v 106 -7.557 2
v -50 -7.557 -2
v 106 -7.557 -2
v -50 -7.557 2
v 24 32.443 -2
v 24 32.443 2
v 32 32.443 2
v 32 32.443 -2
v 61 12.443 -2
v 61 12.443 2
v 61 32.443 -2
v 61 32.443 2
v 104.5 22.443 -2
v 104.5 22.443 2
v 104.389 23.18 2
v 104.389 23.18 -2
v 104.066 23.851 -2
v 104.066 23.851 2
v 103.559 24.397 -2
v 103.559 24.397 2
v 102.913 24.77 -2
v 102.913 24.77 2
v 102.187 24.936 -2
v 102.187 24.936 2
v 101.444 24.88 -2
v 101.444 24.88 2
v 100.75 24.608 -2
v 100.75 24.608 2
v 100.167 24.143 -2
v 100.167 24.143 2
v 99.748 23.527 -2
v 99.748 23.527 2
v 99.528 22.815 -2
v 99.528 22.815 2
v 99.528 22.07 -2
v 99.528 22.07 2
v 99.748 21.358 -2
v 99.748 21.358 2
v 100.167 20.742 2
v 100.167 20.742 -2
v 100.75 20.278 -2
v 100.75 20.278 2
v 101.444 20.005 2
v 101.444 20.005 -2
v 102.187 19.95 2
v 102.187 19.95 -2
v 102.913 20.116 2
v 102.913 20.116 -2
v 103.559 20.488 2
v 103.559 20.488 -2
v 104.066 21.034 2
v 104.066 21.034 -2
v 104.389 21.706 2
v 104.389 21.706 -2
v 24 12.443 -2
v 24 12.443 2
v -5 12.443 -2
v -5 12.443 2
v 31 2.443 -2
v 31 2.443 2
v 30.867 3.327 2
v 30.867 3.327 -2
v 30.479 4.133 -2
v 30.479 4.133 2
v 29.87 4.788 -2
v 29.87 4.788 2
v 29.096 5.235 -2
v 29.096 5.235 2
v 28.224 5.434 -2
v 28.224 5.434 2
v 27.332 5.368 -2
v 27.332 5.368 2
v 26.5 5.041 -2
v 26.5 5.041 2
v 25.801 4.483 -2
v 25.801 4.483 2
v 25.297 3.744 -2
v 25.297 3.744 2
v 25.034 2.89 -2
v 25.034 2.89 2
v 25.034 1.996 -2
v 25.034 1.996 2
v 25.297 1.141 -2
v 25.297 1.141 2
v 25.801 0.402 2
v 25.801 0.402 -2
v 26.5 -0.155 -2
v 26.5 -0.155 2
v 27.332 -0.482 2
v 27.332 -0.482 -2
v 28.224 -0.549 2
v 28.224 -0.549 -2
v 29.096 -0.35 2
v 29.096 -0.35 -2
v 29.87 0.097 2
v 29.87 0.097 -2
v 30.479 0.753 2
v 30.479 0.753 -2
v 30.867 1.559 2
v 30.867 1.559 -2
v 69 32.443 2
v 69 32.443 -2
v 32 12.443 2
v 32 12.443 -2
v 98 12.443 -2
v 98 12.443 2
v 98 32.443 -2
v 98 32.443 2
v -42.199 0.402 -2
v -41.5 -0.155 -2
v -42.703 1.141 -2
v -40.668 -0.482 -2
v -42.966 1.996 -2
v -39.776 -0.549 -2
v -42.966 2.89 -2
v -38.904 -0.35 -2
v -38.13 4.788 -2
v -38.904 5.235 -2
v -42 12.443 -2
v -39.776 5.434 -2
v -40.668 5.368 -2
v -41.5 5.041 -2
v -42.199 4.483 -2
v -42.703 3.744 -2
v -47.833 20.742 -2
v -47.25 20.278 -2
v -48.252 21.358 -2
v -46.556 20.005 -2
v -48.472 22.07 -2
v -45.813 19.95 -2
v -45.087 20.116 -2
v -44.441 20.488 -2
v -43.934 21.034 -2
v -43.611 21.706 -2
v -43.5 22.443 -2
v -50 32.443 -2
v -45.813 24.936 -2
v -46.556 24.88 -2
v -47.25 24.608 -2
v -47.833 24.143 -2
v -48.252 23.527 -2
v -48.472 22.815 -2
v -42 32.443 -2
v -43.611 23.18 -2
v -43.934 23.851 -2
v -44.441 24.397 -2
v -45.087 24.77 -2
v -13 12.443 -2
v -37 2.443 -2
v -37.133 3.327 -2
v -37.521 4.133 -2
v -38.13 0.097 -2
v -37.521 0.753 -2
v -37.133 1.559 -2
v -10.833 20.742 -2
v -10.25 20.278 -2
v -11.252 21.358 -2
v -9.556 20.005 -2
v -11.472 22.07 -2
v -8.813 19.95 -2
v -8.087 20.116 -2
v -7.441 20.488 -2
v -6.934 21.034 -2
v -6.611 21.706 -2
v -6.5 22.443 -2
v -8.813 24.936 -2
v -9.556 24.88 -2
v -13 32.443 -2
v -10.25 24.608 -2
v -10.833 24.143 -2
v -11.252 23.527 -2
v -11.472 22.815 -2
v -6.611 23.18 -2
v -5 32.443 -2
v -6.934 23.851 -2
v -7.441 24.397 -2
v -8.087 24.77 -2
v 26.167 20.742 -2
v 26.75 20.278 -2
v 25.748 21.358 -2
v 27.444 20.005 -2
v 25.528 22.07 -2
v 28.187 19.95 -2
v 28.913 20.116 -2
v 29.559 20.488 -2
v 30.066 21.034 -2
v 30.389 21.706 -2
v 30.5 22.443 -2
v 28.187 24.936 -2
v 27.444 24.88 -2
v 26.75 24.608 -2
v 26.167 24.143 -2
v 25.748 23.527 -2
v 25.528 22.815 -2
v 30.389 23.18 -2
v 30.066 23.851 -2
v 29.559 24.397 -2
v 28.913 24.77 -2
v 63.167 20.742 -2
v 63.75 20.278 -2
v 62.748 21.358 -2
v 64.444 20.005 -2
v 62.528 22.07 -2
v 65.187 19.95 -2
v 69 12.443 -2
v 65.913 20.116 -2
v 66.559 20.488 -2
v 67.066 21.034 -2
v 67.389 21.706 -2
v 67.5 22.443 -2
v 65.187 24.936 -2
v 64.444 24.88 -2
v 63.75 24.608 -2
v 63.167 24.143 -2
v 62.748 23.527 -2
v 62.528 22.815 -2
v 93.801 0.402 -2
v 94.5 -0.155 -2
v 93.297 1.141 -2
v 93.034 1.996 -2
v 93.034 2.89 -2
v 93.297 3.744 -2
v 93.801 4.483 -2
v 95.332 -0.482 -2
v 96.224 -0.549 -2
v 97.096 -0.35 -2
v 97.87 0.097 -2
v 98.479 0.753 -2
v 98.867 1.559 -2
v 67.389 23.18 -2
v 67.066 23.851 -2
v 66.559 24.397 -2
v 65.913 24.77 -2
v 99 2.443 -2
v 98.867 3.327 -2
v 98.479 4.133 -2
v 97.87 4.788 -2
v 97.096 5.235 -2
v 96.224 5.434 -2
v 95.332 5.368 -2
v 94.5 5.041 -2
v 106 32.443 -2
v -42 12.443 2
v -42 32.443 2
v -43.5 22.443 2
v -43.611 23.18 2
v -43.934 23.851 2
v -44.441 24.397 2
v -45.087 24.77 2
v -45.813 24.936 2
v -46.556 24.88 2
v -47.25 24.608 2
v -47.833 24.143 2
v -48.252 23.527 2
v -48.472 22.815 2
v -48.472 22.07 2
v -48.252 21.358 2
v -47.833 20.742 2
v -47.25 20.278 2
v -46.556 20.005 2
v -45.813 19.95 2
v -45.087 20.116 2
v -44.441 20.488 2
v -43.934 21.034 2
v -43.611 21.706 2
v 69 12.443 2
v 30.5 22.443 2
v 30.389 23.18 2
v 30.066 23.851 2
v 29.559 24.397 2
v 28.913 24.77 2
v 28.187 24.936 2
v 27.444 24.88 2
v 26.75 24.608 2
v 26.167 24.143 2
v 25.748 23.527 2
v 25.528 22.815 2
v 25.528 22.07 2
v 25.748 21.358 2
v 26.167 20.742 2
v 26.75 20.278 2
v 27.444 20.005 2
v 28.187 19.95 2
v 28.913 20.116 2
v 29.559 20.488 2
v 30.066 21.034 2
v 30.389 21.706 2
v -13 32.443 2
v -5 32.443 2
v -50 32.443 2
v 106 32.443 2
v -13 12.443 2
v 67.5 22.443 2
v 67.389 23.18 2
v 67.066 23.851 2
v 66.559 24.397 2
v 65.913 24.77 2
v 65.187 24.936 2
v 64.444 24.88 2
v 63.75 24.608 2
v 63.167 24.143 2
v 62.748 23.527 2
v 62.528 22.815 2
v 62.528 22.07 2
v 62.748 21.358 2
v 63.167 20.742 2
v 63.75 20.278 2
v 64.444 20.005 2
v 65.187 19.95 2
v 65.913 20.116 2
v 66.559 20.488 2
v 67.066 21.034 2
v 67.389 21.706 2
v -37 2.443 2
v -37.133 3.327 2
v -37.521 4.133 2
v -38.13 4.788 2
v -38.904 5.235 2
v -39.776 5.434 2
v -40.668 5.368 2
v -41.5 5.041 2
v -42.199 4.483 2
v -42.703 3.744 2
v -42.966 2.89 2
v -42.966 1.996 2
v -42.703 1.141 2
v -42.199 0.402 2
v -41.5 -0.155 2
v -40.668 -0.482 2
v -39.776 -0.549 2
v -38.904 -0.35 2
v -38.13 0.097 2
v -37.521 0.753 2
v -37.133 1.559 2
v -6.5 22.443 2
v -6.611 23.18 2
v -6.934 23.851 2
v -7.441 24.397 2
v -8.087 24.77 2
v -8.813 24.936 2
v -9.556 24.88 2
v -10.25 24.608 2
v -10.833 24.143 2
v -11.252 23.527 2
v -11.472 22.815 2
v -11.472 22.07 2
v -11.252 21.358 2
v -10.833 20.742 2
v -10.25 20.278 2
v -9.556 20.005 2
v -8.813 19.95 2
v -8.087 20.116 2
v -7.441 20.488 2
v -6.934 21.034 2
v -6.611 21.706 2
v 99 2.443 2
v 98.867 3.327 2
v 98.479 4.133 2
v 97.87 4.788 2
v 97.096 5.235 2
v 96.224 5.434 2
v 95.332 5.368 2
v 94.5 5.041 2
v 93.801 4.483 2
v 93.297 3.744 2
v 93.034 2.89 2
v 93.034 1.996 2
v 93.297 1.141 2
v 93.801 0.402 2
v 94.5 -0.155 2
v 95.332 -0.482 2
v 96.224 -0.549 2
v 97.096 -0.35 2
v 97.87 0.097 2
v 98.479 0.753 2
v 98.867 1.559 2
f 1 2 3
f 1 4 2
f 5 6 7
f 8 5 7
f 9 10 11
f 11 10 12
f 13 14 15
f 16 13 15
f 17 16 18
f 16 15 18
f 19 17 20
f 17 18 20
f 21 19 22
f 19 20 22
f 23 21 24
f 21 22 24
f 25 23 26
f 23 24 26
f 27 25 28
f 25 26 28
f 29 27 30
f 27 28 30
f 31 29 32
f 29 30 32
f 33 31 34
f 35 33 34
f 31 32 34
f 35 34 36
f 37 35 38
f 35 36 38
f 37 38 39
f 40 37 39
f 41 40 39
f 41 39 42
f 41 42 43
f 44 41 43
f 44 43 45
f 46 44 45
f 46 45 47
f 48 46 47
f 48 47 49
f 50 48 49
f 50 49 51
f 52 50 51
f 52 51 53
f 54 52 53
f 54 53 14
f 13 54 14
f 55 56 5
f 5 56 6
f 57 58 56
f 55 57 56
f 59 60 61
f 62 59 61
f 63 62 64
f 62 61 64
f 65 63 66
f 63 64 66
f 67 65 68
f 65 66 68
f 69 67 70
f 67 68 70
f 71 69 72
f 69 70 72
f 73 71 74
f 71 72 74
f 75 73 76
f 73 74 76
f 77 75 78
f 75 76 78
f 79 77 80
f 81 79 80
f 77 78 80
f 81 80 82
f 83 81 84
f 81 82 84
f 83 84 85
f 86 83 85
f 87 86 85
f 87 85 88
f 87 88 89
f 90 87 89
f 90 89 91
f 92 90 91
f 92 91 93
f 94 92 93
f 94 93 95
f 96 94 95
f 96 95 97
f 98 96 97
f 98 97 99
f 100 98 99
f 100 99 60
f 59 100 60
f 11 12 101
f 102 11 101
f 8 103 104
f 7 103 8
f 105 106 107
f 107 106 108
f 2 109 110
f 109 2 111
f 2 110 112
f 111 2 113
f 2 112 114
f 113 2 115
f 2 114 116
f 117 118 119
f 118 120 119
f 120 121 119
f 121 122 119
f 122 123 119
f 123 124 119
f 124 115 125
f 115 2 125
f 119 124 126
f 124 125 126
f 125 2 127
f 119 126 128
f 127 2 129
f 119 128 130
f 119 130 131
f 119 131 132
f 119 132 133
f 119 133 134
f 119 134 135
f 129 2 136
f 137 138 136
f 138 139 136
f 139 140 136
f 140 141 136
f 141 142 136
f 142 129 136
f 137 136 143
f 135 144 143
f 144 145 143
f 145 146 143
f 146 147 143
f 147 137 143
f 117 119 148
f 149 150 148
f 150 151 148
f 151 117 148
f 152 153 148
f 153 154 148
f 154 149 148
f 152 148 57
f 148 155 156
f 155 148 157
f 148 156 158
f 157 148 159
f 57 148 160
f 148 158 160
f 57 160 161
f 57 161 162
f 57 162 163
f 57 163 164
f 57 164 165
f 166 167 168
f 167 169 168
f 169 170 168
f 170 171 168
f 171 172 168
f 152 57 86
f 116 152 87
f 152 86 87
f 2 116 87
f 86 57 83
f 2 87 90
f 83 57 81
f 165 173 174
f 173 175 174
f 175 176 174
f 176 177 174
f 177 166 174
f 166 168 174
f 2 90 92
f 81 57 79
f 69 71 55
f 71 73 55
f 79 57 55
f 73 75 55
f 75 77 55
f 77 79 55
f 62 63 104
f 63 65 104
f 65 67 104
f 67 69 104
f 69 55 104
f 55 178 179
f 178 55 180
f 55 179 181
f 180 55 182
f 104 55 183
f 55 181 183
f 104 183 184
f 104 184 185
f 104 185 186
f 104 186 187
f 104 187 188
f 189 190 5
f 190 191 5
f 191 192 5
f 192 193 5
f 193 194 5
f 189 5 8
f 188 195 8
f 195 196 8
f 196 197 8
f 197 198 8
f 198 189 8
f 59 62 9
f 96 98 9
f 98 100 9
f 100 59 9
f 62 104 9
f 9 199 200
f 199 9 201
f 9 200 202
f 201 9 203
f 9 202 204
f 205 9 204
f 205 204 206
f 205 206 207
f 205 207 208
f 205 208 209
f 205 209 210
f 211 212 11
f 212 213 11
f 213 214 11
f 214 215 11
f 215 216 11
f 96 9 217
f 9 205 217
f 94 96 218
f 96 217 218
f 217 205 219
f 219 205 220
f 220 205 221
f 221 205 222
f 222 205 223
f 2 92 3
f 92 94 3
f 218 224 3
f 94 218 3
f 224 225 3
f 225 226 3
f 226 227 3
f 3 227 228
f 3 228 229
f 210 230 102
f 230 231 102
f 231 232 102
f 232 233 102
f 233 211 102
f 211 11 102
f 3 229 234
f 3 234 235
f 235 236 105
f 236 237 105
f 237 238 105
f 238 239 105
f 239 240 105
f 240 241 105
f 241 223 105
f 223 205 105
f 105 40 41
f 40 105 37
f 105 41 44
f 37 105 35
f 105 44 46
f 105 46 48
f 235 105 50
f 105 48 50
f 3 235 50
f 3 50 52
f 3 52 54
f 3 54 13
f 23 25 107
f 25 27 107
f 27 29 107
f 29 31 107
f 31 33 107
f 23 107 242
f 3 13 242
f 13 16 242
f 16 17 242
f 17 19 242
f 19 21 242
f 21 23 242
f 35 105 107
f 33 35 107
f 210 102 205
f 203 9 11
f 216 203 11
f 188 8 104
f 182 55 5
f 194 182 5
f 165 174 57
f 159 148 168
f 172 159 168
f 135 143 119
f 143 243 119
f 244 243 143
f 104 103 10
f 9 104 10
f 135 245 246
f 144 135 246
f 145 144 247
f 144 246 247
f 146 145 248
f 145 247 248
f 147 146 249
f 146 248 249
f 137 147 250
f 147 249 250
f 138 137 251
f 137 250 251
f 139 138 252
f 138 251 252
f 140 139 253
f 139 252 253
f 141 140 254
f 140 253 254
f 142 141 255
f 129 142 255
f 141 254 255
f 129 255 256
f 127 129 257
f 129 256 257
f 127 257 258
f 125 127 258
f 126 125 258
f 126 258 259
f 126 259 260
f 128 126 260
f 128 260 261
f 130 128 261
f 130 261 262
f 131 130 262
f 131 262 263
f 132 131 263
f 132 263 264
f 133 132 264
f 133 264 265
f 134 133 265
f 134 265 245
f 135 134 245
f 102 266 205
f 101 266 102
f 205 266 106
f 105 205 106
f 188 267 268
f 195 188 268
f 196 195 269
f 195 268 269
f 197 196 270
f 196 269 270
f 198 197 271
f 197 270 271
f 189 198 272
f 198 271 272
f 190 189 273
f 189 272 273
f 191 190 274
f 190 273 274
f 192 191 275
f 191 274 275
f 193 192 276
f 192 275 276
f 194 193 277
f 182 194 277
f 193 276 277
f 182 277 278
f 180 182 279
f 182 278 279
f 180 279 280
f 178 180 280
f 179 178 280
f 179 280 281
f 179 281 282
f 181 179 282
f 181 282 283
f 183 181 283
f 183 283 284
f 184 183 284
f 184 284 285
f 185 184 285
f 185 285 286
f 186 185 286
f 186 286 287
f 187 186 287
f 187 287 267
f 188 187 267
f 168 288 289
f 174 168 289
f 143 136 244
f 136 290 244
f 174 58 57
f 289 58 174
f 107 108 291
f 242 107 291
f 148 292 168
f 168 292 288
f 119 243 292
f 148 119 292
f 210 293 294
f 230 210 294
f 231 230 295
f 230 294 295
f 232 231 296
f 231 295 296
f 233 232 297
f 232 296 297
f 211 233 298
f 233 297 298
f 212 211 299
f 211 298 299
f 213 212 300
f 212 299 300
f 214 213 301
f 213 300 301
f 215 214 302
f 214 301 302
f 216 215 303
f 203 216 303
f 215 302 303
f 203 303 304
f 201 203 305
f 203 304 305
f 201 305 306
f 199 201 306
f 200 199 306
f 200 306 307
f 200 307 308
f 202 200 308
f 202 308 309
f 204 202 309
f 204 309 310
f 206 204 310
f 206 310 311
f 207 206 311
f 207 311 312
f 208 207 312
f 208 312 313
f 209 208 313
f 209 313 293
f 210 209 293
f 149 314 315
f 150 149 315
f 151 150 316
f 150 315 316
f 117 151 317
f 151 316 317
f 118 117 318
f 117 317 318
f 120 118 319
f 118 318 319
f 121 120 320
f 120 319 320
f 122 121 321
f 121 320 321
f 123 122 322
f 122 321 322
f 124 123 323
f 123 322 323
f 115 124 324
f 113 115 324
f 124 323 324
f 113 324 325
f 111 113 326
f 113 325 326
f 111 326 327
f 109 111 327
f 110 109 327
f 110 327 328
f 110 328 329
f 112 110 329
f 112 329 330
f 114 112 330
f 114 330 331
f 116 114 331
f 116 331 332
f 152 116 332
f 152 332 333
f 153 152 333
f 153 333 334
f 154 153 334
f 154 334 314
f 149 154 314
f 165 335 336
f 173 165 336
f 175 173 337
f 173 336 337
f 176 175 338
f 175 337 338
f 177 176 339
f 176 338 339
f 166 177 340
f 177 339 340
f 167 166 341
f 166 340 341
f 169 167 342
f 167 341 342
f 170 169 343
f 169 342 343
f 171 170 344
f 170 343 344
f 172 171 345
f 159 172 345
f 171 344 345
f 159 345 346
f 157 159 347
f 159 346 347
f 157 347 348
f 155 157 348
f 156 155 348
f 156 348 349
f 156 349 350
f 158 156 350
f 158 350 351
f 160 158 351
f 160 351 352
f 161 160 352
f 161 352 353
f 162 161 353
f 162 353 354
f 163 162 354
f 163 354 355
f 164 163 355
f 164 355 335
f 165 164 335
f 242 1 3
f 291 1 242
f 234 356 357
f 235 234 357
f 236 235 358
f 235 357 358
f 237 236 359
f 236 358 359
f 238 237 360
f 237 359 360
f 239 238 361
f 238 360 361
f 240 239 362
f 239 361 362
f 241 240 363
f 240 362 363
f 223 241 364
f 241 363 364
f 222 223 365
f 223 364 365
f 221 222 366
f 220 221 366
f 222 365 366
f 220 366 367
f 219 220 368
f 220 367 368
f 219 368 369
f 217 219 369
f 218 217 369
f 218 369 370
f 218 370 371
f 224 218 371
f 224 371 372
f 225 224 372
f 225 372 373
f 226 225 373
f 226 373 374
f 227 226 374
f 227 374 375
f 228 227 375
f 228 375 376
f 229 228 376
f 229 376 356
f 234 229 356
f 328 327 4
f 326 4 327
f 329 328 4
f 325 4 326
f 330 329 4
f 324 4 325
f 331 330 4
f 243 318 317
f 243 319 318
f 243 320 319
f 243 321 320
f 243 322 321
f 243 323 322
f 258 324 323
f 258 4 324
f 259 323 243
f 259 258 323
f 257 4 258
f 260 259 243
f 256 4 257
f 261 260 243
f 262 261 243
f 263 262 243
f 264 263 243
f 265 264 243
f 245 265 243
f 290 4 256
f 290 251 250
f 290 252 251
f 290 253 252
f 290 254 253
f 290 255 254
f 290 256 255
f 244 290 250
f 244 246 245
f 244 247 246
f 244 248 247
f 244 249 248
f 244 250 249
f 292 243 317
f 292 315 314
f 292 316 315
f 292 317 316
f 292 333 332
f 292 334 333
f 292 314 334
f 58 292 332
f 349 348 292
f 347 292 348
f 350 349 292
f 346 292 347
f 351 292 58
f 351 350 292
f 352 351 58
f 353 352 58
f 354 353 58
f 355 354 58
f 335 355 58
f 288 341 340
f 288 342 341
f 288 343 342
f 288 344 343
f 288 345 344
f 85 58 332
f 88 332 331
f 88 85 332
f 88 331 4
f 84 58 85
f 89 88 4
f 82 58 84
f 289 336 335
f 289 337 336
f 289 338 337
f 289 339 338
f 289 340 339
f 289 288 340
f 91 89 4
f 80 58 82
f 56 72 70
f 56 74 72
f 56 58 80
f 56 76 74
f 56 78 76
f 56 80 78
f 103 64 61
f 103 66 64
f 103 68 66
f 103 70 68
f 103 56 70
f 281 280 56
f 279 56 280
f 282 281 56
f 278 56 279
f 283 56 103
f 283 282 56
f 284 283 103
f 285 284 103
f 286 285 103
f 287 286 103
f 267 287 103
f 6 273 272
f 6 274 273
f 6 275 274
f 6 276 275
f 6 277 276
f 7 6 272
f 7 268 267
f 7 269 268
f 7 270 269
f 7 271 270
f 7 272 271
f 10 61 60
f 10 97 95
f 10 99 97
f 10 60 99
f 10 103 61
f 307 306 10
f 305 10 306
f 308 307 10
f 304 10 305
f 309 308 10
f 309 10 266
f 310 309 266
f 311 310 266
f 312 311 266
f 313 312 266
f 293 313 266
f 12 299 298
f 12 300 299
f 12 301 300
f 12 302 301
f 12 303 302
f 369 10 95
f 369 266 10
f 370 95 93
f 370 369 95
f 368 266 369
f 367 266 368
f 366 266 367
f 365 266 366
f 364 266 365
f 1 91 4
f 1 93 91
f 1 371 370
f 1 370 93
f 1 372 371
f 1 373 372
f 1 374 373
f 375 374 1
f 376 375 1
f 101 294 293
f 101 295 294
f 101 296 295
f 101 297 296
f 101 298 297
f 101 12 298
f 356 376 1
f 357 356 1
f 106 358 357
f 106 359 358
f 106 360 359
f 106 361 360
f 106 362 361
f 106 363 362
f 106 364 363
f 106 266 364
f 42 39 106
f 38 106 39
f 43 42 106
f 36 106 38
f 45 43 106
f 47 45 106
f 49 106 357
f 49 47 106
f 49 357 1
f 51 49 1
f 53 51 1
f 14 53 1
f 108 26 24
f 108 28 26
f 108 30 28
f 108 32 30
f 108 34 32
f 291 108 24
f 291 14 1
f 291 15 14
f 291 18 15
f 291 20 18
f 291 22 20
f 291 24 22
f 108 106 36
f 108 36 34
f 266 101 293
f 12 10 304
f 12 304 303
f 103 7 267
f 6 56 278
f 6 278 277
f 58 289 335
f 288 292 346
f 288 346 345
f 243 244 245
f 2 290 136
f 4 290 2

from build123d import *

# Parameters (mm, degrees)
SKETCH1_W           = 156
SKETCH1_H           = 20
SKETCH1_W_2         = 8
BOSS_EXTRUDE1_DEPTH = 2
SKETCH2_R           = 2.5
CUT_EXTRUDE1_DEPTH  = 111.92580296
LPATTERN1_COUNT     = 5
LPATTERN1_PITCH     = 37
SKETCH3_R           = 3
CUT_EXTRUDE2_DEPTH  = 111.92580296


with BuildPart() as part:
    # Sketch1 → Boss-Extrude1 (new, symmetric)
    with BuildSketch(Plane.XY):
        with Locations((28, 2.442776735)):
            Rectangle(SKETCH1_W, SKETCH1_H)
        with Locations((102, 22.442776735)):
            Rectangle(SKETCH1_W_2, SKETCH1_H)
        with Locations((65, 22.442776735)):
            Rectangle(SKETCH1_W_2, SKETCH1_H)
        with Locations((28, 22.442776735)):
            Rectangle(SKETCH1_W_2, SKETCH1_H)
        with Locations((-9, 22.442776735)):
            Rectangle(SKETCH1_W_2, SKETCH1_H)
        with Locations((-46, 22.442776735)):
            Rectangle(SKETCH1_W_2, SKETCH1_H)
    extrude(amount=BOSS_EXTRUDE1_DEPTH, both=True)

    # Sketch2 → Cut-Extrude1 (cut, through all)
    with BuildSketch(Plane.XY.offset(2)):
        with Locations((-46, 22.442776735)):
            Circle(SKETCH2_R)
    cut_extrude1 = extrude(amount=-CUT_EXTRUDE1_DEPTH, mode=Mode.SUBTRACT)

    # LPattern1: Cut-Extrude1 ×5
    with Locations(*[(i * LPATTERN1_PITCH, 0, 0) for i in range(1, LPATTERN1_COUNT)]):
        add(cut_extrude1, mode=Mode.SUBTRACT)

    # Sketch3 → Cut-Extrude2 (cut, through all)
    with BuildSketch(Plane.XY.offset(2)):
        with Locations((28, 2.442776735)):
            Circle(SKETCH3_R)
        with Locations((96, 2.442776735)):
            Circle(SKETCH3_R)
        with Locations((-40, 2.442776735)):
            Circle(SKETCH3_R)
    extrude(amount=-CUT_EXTRUDE2_DEPTH, mode=Mode.SUBTRACT)


solid = part.part
